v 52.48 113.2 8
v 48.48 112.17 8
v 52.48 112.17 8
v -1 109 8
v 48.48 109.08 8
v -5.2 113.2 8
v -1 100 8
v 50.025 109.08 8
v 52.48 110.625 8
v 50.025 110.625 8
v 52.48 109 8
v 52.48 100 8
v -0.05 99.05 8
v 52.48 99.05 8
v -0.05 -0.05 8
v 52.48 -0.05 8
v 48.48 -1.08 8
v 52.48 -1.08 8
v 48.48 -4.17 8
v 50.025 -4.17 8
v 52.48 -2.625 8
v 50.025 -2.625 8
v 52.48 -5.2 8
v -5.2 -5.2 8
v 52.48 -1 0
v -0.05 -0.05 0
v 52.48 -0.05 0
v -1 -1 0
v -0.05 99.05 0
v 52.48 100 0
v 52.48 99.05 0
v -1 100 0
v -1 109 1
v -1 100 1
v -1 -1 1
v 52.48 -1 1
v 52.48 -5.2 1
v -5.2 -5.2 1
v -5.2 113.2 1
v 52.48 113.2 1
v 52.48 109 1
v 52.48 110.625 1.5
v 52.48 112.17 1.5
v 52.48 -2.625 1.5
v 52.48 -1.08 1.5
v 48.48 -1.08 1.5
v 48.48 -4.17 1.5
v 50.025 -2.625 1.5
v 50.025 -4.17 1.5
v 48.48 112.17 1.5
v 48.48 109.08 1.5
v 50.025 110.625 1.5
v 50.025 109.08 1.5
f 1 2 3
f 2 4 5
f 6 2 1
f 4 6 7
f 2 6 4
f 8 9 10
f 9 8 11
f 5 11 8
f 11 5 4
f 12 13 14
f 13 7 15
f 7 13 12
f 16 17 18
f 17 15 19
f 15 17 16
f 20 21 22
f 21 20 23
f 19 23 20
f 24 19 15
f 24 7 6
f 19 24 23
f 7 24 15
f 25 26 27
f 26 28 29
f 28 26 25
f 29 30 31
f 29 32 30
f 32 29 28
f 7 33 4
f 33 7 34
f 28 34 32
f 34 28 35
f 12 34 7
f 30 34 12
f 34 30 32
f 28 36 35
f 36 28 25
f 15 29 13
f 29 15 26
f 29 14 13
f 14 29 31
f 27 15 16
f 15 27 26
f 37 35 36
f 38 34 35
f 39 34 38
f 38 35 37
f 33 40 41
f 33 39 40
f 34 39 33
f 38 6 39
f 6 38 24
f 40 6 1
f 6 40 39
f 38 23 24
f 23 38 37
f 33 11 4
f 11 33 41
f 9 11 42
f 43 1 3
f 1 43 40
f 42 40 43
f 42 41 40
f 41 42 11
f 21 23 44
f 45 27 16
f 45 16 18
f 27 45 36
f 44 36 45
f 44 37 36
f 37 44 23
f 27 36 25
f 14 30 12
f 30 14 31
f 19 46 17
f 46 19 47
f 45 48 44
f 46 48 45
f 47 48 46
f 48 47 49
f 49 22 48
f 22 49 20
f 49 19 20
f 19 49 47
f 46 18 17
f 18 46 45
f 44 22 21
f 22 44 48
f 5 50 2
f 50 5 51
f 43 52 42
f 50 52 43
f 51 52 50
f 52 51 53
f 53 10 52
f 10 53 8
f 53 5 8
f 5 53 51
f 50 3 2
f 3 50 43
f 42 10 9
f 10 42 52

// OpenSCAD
// Generated by SolidPython 1.0.4 on 2021-07-12 16:55:53


difference() {
	difference() {
		difference() {
			union() {
				difference() {
					translate(v = [-1.0000000000, -1.0000000000, 0]) {
						cube(size = [65.0000000000, 101.0000000000, 8]);
					}
					translate(v = [-0.0500000000, -0.0500000000, 0]) {
						cube(size = [63.1000000000, 99.1000000000, 8]);
					}
				}
				translate(v = [0, 0, 1]) {
					difference() {
						translate(v = [-5.2000000000, -5.2000000000, 0]) {
							cube(size = [82.4000000000, 118.4000000000, 7]);
						}
						translate(v = [-1.0000000000, -1.0000000000, 0]) {
							cube(size = [74.0000000000, 110.0000000000, 7]);
						}
					}
				}
			}
			translate(v = [52.4800000000, -5.2000000000, 0]) {
				cube(size = [24.7200000000, 118.4000000000, 8]);
			}
		}
		translate(v = [48.4800000000, -4.1700000000, 0]) {
			translate(v = [0, 0, 1.5000000000]) {
				translate(v = [4, 3.0900000000, 0]) {
					rotate(a = -180) {
						union() {
							translate(v = [2.4550000000, 0, 0]) {
								cube(size = [1.5450000000, 3.0900000000, 6.5000000000]);
							}
							cube(size = [4, 1.5450000000, 6.5000000000]);
						}
					}
				}
			}
		}
	}
	translate(v = [48.4800000000, 109.0800000000, 0]) {
		translate(v = [0, 0, 1.5000000000]) {
			translate(v = [4, 3.0900000000, 0]) {
				rotate(a = -180) {
					union() {
						translate(v = [2.4550000000, 0, 0]) {
							cube(size = [1.5450000000, 3.0900000000, 6.5000000000]);
						}
						cube(size = [4, 1.5450000000, 6.5000000000]);
					}
				}
			}
		}
	}
}
